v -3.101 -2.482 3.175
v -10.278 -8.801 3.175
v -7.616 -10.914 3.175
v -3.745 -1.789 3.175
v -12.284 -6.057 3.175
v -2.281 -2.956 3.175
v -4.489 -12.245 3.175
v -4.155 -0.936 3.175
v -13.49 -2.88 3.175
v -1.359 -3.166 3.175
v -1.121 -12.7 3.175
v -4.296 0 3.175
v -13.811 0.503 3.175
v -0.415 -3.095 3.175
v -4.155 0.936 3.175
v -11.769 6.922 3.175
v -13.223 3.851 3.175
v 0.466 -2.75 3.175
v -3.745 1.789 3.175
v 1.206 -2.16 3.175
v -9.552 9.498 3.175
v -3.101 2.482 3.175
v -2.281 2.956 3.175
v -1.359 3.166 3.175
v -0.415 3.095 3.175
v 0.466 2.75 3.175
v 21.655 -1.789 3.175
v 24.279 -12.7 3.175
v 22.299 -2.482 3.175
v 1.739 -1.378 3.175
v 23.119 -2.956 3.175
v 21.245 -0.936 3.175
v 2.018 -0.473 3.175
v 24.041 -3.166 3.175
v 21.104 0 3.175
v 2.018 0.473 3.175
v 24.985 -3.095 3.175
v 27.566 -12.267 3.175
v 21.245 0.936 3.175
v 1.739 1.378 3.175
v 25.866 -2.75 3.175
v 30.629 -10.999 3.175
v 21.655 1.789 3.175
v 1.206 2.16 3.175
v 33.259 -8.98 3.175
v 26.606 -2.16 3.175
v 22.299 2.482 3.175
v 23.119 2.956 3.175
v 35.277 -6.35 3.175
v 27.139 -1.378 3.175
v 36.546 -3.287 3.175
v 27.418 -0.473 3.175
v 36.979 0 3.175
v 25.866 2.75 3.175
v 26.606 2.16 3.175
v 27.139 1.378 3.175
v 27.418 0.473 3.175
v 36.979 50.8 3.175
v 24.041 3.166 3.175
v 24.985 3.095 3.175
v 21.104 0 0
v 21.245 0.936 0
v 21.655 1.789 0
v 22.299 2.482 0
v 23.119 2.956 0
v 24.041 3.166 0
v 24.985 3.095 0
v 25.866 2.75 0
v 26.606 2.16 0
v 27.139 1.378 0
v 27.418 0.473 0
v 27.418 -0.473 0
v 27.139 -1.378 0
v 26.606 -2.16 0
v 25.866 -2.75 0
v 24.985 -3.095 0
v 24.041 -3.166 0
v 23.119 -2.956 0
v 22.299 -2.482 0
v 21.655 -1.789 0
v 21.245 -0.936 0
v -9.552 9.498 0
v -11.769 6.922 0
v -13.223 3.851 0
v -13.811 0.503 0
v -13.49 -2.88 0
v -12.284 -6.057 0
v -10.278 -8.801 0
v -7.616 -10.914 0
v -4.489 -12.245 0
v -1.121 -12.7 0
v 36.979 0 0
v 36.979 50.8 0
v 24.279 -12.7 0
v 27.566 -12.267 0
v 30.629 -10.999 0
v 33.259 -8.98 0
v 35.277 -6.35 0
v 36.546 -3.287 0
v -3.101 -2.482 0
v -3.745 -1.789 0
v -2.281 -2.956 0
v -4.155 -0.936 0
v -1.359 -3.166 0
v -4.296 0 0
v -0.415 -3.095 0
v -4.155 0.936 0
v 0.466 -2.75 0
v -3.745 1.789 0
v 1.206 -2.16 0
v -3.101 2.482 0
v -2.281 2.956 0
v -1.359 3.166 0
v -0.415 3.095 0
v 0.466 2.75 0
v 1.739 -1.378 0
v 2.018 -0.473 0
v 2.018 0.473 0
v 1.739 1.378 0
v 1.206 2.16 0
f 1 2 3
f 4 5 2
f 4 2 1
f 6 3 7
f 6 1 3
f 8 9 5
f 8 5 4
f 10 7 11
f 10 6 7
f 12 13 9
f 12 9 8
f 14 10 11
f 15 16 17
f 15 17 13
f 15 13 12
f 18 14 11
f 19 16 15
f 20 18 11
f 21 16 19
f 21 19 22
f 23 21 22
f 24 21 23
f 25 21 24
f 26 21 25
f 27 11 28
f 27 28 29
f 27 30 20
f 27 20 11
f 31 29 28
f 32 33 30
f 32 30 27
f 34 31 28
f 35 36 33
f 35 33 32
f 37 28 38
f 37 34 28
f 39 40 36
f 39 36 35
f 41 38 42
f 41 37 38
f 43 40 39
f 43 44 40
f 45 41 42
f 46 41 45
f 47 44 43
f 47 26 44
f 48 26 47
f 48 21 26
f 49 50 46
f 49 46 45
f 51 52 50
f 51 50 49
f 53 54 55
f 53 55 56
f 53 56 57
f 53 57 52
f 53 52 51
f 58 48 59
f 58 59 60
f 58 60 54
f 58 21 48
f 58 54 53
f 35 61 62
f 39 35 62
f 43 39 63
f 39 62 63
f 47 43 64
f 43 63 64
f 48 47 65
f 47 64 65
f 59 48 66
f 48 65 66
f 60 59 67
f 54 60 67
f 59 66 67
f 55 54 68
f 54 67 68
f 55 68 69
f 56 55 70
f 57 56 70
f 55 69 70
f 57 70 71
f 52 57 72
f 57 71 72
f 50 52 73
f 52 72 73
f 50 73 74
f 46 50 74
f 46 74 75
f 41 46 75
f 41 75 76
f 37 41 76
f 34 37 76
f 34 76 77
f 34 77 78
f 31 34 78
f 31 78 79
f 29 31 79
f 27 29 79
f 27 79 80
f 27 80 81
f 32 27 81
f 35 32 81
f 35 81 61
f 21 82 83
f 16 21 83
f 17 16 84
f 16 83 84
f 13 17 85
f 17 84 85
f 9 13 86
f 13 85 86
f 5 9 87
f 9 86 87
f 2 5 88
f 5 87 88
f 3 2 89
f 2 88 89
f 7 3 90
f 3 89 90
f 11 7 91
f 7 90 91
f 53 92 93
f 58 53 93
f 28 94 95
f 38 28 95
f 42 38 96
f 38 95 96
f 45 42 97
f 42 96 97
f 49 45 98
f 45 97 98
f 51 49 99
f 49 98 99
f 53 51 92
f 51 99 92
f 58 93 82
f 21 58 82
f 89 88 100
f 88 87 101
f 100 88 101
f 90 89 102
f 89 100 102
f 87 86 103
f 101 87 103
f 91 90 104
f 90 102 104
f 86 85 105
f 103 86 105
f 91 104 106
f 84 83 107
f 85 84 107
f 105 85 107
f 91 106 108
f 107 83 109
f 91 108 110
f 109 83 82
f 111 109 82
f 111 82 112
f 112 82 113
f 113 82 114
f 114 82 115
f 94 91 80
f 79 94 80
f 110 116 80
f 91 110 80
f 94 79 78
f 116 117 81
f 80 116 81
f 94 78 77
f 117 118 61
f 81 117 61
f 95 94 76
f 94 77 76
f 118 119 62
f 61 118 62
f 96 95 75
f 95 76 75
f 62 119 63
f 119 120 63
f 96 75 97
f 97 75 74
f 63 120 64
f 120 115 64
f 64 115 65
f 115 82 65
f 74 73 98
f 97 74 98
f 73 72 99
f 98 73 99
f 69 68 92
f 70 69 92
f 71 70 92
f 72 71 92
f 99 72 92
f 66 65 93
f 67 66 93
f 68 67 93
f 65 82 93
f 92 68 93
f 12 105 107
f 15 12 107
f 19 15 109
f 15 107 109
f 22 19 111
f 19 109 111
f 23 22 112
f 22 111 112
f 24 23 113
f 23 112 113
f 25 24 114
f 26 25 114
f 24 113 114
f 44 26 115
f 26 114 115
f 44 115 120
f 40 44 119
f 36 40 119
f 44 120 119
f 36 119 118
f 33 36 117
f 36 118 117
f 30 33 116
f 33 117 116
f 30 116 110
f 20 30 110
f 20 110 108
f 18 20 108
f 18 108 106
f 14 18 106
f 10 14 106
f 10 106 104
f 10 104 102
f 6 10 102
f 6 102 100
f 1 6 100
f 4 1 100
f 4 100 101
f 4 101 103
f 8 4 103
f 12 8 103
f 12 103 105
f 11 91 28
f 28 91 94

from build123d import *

# Parameters (mm, degrees)
F1_DEPTH = 3.175
F3_D     = 6.35


with BuildPart() as f1:
    # F0 (on Top) → F1 (new body)
    with BuildSketch(Plane.XY):
        with BuildLine():
            ThreePointArc((-9.552005, 9.498045), (-12.993834, -4.509148), (-1.121279, -12.7))
            Line((-1.121279, -12.7), (24.278721, -12.7))
            ThreePointArc((24.278721, -12.7), (33.258978, -8.980256), (36.978721, 0))
            Line((36.978721, 0), (36.978721, 50.8))
            Line((36.978721, 50.8), (-9.552005, 9.498045))
        make_face()
    extrude(amount=F1_DEPTH)

    # F3 (through all)
    with Locations(Plane.XY.offset(3.175)):
        with Locations((24.278721, 0), (-1.121279, 0)):
            Hole(F3_D / 2)


solid = f1.part
